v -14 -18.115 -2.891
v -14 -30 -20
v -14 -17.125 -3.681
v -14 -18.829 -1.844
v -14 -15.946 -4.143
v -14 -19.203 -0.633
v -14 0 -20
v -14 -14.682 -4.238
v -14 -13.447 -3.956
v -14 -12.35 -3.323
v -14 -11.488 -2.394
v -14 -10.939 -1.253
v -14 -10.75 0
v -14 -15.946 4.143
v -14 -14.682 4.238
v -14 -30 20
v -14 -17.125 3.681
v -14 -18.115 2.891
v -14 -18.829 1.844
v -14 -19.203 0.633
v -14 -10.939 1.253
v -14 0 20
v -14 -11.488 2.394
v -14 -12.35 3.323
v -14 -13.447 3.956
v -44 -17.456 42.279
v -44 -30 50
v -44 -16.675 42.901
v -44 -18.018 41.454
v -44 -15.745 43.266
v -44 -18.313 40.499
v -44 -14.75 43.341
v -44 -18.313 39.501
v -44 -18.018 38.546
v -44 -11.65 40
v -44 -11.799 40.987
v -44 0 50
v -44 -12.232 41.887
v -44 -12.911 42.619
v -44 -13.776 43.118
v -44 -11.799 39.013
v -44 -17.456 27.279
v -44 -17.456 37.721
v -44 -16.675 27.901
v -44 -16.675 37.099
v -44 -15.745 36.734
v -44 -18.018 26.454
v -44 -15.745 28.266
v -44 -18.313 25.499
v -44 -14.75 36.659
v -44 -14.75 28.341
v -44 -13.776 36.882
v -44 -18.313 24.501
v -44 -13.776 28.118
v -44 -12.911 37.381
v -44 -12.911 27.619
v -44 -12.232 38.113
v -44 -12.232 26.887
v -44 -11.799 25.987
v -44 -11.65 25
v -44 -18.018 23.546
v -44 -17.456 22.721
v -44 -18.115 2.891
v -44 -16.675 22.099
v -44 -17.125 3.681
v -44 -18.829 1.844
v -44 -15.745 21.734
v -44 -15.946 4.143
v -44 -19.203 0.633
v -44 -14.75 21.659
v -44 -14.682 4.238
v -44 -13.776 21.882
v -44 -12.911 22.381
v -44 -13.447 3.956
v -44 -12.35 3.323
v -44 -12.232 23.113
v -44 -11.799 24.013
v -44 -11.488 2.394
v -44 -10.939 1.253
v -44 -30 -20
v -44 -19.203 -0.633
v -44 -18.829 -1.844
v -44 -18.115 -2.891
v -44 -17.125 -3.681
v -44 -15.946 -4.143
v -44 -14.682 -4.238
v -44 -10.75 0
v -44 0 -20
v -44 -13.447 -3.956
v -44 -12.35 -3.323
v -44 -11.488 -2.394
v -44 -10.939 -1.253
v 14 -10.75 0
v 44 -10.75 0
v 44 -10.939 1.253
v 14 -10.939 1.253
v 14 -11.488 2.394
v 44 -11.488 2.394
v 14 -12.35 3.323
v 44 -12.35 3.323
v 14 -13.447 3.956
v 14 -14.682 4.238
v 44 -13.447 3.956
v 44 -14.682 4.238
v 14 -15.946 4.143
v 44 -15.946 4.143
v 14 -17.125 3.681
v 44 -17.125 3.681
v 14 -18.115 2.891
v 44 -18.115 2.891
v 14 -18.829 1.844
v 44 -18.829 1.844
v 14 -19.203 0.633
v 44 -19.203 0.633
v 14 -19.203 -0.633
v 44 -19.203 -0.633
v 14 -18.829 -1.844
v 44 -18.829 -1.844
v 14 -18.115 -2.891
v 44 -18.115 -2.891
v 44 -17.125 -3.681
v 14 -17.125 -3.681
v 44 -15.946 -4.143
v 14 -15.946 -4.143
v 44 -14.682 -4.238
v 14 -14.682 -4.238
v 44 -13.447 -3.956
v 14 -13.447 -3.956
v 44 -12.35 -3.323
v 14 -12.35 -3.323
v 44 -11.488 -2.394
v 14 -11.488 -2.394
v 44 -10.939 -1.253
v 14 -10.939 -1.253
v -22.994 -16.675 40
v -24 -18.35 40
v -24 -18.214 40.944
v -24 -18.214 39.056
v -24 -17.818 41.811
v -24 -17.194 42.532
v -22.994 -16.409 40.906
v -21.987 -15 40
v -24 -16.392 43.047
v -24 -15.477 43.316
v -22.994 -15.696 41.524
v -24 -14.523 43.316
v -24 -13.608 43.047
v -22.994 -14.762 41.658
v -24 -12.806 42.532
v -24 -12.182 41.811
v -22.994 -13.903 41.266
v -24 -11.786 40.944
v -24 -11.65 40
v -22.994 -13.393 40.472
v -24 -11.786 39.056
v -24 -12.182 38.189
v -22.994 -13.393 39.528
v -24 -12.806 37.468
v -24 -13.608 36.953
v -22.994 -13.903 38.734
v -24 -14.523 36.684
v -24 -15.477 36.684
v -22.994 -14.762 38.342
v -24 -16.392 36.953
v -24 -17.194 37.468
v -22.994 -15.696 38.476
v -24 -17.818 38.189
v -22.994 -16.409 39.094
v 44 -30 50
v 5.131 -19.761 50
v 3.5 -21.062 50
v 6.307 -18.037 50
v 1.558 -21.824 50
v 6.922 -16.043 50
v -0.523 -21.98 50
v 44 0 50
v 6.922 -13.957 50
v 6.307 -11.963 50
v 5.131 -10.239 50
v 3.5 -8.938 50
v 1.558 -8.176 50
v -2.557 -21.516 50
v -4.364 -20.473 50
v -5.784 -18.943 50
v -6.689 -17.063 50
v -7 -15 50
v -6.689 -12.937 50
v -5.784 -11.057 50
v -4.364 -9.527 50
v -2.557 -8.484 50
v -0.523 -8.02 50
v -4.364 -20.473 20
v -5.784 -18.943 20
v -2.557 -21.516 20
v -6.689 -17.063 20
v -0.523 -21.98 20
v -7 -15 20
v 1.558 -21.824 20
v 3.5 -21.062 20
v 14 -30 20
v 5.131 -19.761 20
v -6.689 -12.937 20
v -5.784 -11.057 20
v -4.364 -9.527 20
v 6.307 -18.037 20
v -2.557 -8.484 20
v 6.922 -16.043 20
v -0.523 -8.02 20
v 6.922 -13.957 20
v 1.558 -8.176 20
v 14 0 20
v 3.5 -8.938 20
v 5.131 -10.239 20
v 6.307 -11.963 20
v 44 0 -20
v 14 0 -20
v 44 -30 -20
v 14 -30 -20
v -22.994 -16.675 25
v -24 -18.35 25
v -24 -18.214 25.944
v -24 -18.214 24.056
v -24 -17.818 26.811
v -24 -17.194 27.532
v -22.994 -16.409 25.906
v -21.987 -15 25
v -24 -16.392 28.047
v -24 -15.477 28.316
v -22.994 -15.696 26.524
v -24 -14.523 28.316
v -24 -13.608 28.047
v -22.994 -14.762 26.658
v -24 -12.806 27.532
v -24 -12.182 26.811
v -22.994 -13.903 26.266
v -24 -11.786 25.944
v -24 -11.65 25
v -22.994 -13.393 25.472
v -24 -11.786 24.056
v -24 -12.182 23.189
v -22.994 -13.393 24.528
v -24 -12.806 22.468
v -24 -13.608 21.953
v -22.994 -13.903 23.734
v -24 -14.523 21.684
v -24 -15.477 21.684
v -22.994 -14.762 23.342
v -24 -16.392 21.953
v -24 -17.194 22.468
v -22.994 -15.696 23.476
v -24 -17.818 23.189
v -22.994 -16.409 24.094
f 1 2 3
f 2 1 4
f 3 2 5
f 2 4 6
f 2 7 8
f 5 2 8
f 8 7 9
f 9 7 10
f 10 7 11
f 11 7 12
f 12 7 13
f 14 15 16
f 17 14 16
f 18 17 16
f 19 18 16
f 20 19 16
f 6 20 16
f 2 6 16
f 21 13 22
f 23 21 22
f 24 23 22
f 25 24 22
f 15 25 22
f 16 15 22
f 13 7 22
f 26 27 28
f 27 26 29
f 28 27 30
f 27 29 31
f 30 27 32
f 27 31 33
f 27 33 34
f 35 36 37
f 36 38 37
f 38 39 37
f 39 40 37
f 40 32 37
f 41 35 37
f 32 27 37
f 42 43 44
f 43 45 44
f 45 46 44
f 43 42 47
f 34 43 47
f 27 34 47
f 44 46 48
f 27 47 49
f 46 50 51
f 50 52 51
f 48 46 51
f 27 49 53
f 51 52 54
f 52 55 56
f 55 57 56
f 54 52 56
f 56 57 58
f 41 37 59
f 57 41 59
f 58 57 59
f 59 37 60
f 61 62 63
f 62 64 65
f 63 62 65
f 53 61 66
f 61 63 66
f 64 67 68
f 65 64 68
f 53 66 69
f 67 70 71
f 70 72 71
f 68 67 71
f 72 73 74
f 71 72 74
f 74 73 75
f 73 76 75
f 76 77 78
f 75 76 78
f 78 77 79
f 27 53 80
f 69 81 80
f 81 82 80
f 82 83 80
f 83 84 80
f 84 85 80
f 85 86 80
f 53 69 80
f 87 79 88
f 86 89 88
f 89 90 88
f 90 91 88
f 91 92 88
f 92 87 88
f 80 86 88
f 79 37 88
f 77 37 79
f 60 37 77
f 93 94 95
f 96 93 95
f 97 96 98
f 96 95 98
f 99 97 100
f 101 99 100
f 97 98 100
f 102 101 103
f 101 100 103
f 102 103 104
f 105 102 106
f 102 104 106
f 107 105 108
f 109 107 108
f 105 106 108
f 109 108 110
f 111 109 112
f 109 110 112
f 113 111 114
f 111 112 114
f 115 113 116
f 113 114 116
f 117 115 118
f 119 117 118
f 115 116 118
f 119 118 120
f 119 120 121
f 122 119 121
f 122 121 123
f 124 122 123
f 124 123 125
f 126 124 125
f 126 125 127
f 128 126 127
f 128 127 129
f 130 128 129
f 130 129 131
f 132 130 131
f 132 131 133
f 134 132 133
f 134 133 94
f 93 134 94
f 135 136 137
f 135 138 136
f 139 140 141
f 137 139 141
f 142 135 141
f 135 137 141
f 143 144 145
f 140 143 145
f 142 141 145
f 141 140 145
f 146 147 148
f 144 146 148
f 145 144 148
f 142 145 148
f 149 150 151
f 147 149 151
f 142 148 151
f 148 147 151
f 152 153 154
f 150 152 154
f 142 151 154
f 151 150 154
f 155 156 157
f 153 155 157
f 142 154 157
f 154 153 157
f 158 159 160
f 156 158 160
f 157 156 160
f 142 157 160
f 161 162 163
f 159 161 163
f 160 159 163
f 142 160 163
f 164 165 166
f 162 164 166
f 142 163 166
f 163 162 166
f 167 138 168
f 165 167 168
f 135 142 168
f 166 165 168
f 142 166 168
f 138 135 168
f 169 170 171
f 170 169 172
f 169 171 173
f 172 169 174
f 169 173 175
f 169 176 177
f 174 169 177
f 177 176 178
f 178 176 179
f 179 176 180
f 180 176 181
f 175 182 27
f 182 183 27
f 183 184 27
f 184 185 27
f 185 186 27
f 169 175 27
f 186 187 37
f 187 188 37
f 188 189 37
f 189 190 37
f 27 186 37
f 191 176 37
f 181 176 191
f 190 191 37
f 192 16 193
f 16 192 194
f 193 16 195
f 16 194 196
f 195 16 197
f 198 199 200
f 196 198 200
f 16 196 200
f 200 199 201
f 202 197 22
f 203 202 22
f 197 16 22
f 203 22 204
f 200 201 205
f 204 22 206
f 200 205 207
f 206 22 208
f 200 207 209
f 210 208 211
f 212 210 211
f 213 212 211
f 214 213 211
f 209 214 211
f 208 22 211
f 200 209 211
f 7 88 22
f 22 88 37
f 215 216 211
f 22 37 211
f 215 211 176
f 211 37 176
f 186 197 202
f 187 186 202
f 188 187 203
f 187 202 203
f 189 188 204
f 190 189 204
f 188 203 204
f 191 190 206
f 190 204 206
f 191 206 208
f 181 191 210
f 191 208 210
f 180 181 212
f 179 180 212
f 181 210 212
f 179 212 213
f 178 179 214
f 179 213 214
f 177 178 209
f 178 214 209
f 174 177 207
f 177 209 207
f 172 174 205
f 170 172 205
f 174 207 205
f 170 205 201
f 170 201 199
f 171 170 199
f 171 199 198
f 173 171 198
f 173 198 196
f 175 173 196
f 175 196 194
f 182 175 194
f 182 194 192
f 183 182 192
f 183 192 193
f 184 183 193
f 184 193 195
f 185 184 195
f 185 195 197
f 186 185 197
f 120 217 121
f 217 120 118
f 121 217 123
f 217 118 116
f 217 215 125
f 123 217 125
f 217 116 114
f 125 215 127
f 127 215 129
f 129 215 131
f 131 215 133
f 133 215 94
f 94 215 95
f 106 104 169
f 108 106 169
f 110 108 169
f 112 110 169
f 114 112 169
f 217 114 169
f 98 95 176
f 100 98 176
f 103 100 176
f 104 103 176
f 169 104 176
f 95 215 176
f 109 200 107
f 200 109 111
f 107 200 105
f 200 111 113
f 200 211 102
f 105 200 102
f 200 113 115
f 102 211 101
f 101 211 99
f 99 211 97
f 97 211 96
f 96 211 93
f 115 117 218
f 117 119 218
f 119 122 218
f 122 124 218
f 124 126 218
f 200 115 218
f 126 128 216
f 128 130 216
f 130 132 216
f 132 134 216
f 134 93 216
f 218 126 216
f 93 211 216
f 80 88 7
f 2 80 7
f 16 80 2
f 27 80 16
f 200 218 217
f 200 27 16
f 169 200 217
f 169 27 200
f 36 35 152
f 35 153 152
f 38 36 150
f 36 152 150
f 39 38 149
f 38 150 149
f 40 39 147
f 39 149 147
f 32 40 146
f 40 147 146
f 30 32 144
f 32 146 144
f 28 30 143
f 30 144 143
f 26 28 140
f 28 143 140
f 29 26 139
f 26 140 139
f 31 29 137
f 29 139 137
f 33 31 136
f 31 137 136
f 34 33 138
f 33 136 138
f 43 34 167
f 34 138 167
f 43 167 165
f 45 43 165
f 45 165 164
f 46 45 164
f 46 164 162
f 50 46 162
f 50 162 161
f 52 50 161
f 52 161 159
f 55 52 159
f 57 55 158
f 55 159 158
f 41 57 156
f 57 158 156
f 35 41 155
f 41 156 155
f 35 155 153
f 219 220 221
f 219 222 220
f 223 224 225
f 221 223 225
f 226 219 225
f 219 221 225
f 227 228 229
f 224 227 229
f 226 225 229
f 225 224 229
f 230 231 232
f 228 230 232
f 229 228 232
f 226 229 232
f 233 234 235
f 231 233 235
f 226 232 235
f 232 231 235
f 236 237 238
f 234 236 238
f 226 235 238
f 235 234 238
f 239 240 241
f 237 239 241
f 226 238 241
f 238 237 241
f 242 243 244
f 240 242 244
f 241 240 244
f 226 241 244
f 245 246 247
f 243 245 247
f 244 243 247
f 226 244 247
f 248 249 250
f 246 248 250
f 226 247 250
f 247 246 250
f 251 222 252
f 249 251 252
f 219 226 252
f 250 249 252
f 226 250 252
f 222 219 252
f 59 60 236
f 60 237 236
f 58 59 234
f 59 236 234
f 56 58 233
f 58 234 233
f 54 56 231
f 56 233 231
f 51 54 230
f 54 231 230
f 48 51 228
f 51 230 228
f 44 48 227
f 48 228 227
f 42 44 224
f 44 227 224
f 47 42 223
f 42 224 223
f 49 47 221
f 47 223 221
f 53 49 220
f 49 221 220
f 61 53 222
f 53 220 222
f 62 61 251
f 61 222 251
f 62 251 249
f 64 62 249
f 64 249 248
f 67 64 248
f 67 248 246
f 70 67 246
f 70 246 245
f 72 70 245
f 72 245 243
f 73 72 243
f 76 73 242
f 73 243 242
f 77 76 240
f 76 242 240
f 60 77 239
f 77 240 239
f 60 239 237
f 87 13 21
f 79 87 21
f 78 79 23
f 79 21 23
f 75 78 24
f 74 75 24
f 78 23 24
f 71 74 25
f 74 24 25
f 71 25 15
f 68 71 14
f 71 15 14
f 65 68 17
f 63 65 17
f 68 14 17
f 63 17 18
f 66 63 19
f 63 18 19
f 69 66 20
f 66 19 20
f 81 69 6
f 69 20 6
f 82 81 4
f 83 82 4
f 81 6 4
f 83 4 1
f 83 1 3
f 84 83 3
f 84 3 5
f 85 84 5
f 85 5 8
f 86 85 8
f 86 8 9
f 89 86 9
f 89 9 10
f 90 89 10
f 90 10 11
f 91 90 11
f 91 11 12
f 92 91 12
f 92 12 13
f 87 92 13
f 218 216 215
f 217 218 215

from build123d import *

# Parameters (mm, degrees)
F1_DEPTH = 30
F3_D     = 6.7
F3_DEPTH = 20
F3_TIP   = 2.0128830737
F5_D     = 14
F7_D     = 8.5


with BuildPart() as f1:
    # F0 (on Front) → F1 (new body)
    with BuildSketch(Plane.XZ):
        Polygon((-14, 20), (14, 20), (14, -20), (44, -20), (44, 50), (-44, 50), (-44, -20), (-14, -20), align=None)
    extrude(amount=F1_DEPTH)

    # F3
    with Locations(Plane(origin=(-44, 0, 0), x_dir=(0, -1, 0), z_dir=(-1, 0, 0))):
        with Locations((15, 40), (15, 25)):
            Hole(F3_D / 2, depth=F3_DEPTH)
            with Locations((0, 0, -(F3_DEPTH + F3_TIP / 2))):  # 118° drill point
                Cone(0, F3_D / 2, F3_TIP, mode=Mode.SUBTRACT)

    # F5 (through all)
    with Locations(Plane.XY.offset(50)):
        with Locations((0, -15)):
            Hole(F5_D / 2)

    # F7 (through all)
    with Locations(Plane(origin=(-44, 0, 0), x_dir=(0, -1, 0), z_dir=(-1, 0, 0))):
        with Locations((15, 0)):
            Hole(F7_D / 2)


solid = f1.part
